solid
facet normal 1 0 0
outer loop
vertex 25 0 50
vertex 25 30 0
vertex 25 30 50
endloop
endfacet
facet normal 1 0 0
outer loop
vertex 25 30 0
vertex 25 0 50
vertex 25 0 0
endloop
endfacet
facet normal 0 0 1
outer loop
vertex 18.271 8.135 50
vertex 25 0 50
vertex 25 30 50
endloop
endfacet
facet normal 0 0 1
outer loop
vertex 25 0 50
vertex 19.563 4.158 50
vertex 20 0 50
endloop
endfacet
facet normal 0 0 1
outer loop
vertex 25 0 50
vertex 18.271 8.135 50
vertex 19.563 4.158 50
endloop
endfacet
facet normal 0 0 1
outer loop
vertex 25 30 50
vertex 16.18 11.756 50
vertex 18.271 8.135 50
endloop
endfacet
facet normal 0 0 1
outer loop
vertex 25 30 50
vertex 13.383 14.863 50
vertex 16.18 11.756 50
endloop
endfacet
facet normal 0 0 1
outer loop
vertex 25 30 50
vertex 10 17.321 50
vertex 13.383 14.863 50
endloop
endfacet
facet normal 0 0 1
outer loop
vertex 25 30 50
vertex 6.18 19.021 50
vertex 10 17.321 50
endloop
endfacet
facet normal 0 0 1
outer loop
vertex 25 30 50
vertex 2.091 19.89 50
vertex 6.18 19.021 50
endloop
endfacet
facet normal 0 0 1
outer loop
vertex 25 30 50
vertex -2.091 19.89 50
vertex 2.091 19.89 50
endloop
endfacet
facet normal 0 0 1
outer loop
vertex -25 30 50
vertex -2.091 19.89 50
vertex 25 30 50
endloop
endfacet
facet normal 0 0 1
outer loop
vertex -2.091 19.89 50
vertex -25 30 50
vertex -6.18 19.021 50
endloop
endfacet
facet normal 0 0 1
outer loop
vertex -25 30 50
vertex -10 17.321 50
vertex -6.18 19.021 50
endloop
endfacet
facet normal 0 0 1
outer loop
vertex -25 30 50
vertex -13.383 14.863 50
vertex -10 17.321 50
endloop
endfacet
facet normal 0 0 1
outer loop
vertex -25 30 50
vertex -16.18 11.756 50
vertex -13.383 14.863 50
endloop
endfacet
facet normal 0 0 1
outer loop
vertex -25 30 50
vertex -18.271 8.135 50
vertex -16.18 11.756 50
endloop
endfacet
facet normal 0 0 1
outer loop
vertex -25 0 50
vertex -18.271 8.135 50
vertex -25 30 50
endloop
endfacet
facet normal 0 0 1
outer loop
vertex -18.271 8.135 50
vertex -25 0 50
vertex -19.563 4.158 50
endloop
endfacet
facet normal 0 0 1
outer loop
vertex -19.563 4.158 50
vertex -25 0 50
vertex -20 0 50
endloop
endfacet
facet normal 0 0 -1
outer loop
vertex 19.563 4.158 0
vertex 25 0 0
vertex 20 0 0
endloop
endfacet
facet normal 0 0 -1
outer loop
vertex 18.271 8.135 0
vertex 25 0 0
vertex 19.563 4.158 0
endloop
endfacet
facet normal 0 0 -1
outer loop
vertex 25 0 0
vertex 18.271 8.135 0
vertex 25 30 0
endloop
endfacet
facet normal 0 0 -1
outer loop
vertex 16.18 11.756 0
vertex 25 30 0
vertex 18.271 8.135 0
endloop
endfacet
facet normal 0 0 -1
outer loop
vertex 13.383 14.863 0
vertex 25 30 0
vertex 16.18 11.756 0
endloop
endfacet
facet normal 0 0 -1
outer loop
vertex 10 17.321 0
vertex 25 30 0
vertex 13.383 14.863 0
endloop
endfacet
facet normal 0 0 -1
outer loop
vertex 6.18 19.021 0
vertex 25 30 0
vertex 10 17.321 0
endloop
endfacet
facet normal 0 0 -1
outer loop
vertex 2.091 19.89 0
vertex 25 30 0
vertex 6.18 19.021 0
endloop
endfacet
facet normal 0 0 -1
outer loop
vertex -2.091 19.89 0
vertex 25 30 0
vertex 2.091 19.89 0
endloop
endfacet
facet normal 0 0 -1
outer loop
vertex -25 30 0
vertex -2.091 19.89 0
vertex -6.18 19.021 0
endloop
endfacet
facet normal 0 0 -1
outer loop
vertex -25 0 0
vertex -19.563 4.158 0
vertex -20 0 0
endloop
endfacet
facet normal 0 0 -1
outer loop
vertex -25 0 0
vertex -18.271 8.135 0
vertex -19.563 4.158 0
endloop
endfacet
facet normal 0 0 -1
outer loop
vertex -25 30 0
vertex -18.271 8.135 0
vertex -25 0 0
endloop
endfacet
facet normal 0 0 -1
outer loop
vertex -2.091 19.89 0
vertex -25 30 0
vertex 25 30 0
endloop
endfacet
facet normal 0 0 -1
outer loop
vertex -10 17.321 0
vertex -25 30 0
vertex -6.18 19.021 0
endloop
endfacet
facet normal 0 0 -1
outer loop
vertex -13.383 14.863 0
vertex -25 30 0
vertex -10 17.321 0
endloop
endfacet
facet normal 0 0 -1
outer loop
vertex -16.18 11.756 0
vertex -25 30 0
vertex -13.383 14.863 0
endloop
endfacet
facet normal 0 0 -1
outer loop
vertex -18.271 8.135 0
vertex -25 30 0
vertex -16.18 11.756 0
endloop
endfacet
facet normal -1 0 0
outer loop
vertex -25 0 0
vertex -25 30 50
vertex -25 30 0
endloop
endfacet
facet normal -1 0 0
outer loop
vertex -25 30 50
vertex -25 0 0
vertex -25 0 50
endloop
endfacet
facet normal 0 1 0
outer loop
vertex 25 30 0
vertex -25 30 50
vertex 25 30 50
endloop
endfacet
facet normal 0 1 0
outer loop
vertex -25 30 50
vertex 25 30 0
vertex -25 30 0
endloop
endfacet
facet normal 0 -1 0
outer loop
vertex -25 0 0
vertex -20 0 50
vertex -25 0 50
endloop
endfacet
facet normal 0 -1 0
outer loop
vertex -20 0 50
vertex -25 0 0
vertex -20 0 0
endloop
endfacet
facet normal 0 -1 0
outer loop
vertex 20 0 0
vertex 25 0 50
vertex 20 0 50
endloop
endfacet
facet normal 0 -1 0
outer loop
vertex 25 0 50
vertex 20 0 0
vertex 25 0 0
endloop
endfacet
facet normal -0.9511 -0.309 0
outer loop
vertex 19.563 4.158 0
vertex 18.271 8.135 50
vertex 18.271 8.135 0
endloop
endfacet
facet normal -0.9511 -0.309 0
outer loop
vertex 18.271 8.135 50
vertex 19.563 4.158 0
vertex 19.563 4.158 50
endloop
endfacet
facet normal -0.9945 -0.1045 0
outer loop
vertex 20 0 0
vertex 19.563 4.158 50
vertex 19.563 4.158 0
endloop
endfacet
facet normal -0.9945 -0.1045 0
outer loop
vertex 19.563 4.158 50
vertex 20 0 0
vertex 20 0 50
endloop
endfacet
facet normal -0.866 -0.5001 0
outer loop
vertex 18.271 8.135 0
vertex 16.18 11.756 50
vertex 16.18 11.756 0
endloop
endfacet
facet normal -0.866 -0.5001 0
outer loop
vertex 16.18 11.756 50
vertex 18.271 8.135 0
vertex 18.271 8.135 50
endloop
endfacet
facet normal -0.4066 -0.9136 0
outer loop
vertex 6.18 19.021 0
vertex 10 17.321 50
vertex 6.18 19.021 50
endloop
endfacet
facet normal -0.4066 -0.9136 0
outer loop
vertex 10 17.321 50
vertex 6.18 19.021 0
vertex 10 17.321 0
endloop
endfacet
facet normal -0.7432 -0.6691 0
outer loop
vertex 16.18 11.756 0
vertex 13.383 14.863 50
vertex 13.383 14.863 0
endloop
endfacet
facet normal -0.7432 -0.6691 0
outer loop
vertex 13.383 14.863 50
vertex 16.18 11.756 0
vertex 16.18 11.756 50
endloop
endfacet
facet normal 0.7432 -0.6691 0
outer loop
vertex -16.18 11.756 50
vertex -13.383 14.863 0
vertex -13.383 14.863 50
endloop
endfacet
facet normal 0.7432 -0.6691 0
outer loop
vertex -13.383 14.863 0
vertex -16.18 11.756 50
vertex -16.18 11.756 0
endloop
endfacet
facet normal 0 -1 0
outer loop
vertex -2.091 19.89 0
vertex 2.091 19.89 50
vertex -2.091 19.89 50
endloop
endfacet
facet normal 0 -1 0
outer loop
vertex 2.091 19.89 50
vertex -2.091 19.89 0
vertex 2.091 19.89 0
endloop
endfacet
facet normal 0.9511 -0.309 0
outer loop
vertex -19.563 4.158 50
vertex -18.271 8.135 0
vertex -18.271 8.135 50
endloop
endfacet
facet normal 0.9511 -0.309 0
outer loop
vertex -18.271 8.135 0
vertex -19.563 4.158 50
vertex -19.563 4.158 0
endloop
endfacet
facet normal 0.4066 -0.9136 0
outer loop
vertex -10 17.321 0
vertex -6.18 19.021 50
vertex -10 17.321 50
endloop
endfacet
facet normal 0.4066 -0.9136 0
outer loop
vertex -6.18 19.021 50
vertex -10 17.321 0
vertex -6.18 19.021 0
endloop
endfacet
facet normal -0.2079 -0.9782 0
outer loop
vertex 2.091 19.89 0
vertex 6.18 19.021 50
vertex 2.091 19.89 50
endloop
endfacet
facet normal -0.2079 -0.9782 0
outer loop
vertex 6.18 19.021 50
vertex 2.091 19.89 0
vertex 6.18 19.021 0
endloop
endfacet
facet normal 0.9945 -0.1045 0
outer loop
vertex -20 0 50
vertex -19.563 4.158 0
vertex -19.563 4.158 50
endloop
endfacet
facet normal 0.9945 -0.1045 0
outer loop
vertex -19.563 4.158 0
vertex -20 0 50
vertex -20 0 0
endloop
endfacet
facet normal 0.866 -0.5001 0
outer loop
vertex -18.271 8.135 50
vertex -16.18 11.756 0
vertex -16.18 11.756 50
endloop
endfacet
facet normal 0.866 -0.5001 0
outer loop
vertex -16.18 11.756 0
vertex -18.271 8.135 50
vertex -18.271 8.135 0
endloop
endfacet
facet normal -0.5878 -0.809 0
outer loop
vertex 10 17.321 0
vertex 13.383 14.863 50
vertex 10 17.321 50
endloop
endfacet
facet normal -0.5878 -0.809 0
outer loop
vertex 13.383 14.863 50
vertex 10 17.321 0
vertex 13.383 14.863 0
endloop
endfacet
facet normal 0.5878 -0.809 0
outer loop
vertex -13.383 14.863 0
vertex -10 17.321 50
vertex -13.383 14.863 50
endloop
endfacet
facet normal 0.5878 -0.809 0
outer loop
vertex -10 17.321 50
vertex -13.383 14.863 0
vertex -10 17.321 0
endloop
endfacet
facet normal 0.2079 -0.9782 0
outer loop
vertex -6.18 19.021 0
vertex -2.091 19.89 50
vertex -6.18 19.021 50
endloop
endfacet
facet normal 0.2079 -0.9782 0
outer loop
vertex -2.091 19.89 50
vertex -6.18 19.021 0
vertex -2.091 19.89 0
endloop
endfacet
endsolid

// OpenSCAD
// 3D Shapes- Design Time: Halfpipe

difference() {
    translate([-25, 0, 0]) cube([50, 30, 50]);
    translate([0, 0, -1]) cylinder(h=60, r=20);
}
